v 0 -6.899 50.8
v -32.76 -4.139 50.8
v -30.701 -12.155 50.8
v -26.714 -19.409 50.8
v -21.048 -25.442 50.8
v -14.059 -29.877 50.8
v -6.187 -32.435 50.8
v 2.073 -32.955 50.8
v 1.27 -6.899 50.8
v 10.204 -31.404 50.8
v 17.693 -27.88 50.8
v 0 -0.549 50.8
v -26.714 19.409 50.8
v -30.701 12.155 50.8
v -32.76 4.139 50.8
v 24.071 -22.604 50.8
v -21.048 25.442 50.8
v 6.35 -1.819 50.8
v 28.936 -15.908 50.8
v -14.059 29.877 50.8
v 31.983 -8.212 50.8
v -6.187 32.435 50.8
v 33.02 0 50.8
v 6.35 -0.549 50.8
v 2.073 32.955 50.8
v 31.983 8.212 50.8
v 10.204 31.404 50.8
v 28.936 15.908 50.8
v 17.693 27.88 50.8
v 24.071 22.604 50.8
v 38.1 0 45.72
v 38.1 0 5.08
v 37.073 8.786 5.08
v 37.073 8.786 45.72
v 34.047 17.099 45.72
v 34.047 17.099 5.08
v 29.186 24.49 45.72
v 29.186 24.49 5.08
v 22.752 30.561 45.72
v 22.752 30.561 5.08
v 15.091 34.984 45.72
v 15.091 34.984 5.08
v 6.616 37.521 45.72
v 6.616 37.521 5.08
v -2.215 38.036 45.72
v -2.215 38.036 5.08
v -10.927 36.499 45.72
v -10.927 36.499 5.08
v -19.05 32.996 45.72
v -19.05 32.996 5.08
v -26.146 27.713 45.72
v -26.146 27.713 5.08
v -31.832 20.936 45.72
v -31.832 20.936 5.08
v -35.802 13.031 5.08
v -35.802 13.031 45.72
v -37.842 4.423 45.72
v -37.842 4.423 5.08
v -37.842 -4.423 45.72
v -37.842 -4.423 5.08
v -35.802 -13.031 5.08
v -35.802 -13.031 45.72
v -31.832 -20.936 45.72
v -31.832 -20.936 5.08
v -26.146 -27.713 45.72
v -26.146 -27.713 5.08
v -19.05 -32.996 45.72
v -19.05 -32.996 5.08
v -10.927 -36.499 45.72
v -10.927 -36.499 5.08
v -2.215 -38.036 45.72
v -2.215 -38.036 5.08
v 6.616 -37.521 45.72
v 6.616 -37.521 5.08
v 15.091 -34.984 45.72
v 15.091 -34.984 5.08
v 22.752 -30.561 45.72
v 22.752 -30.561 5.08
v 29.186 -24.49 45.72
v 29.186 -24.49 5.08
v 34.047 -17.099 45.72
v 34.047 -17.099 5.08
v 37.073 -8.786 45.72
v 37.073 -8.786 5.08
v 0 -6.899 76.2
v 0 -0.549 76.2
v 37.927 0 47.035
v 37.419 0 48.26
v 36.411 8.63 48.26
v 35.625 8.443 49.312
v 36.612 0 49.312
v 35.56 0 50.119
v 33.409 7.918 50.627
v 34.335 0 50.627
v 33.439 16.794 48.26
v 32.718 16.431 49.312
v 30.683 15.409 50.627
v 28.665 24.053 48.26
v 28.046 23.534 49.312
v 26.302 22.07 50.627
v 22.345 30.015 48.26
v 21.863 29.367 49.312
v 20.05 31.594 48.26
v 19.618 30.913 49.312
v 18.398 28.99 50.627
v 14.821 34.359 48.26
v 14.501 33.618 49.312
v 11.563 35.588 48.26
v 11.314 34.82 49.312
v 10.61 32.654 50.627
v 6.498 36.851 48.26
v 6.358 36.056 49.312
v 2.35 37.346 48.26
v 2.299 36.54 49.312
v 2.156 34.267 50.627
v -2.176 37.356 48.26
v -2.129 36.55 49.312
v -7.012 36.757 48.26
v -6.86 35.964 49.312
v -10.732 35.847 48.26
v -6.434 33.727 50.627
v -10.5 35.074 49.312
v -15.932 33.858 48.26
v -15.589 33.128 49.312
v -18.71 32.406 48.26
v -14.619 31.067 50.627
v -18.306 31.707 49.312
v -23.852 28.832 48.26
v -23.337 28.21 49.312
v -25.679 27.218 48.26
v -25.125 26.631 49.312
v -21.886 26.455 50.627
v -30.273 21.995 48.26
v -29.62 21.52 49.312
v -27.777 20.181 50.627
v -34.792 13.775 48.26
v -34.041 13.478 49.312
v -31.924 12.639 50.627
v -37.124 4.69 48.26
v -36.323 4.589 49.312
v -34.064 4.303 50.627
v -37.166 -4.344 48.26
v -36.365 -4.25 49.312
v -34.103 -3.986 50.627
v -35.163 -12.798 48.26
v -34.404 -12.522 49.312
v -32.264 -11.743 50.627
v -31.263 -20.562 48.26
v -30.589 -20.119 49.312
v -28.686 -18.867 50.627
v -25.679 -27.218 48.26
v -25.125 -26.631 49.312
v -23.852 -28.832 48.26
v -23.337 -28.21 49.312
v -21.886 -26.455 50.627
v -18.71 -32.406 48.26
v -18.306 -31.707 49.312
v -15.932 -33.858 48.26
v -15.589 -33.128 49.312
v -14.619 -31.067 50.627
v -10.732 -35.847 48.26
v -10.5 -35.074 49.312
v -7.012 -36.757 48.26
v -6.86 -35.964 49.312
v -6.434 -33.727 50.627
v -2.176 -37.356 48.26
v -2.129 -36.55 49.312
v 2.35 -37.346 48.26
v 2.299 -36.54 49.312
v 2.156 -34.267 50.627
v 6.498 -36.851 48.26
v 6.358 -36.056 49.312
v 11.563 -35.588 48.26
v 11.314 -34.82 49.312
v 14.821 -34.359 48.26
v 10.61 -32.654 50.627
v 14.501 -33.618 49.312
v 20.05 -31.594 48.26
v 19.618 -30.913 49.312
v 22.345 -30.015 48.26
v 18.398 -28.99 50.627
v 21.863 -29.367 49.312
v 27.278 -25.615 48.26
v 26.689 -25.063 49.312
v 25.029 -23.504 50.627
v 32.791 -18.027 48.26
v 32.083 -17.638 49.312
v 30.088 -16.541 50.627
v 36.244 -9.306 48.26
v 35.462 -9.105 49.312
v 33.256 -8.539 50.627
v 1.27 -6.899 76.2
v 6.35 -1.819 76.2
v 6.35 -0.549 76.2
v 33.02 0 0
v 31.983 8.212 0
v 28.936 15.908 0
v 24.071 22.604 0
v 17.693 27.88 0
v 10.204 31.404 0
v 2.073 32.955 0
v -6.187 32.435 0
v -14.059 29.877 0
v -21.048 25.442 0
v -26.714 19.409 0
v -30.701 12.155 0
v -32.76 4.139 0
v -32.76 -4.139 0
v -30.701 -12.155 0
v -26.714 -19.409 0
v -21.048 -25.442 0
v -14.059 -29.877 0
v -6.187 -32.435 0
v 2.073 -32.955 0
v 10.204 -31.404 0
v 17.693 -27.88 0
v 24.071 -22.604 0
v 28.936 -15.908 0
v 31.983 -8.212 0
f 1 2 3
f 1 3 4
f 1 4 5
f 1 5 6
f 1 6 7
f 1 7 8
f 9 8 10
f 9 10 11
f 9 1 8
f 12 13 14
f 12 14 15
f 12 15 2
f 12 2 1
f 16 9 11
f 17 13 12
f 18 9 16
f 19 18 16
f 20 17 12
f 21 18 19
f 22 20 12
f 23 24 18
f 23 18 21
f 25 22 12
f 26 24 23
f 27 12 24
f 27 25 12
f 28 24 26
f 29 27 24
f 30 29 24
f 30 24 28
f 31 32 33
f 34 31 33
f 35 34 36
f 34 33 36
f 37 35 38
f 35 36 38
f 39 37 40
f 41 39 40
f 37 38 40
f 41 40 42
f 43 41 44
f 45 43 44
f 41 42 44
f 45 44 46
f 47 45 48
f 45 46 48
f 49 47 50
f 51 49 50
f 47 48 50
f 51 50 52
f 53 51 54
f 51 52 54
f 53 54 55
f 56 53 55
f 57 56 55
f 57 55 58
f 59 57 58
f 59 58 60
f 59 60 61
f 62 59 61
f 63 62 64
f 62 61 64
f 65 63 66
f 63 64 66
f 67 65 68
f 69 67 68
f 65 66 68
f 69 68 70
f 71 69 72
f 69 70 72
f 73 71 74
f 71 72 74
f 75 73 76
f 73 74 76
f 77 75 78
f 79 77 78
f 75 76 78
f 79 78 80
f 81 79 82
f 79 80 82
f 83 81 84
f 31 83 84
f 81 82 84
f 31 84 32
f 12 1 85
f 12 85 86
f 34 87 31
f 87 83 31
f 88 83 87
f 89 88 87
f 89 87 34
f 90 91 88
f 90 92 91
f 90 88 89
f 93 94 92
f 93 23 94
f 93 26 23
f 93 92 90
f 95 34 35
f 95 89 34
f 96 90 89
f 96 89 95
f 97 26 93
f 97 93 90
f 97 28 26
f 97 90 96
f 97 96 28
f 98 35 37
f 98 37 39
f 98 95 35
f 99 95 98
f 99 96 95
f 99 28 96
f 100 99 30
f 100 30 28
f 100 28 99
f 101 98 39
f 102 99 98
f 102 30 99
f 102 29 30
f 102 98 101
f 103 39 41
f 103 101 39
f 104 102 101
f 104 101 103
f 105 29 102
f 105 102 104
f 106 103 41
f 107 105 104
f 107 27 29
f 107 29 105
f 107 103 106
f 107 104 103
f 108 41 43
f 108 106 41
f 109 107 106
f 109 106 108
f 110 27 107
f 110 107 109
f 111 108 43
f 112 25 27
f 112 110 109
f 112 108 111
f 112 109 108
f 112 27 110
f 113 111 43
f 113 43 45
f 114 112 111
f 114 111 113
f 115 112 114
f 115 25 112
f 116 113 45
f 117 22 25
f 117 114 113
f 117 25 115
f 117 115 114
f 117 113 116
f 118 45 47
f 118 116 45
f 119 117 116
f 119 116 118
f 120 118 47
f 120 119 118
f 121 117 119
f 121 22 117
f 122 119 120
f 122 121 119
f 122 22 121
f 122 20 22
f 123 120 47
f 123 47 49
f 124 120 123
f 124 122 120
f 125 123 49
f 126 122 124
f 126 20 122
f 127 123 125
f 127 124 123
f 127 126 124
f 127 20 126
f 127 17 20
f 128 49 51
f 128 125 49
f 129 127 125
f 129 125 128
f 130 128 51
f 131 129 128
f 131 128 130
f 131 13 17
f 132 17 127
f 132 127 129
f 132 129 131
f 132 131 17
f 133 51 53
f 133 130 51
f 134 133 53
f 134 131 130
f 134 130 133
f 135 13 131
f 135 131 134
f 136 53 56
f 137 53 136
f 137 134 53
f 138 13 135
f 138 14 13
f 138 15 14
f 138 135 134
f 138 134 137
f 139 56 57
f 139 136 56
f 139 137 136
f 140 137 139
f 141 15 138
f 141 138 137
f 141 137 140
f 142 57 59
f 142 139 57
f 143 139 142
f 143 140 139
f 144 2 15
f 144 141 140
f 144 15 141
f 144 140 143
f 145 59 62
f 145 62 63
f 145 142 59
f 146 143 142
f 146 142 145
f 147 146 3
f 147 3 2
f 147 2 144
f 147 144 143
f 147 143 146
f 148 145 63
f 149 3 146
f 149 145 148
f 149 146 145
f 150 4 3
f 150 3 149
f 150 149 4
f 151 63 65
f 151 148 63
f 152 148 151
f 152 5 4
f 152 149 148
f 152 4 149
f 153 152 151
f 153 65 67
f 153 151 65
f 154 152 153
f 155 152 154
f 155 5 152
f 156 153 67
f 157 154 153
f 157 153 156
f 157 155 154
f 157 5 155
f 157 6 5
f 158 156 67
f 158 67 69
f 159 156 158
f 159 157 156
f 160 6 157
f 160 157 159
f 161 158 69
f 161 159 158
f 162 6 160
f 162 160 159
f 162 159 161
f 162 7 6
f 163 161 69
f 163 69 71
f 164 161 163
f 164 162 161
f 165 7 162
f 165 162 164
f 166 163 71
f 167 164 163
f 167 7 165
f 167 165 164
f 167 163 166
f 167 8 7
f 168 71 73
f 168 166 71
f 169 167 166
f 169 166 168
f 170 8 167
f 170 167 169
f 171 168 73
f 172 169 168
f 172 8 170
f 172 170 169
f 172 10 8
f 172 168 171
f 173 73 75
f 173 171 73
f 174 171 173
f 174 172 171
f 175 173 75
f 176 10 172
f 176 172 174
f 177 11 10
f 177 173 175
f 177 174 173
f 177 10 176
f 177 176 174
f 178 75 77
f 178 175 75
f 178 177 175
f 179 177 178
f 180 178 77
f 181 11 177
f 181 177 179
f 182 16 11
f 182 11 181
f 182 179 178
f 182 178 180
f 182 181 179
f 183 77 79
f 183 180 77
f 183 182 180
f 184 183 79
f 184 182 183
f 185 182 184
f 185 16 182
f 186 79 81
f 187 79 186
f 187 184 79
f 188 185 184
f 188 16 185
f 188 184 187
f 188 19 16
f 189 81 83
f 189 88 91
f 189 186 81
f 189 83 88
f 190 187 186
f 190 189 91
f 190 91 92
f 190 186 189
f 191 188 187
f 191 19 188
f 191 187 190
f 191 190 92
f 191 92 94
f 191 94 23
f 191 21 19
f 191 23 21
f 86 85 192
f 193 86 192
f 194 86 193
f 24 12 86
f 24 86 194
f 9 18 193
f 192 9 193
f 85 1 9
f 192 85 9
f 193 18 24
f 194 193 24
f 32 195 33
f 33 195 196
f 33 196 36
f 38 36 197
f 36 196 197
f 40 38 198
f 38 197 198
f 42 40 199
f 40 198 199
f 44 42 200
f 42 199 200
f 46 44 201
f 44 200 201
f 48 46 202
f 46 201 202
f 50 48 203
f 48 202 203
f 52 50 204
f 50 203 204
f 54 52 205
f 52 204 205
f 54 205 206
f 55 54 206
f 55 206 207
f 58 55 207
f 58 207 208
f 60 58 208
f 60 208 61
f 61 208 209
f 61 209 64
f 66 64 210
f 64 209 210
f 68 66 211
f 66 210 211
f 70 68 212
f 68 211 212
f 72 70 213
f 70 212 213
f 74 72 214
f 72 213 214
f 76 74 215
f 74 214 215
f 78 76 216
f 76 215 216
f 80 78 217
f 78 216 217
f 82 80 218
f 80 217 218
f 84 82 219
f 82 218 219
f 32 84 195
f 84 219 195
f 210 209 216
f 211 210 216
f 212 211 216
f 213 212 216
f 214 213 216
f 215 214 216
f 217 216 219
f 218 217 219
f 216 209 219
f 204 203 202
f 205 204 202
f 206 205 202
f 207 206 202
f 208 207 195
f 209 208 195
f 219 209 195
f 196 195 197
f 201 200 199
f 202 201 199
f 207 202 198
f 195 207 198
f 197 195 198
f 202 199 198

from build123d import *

# Parameters (mm, degrees)
F0_R     = 38.1
F1_DEPTH = 50.8
F2_W     = 6.35
F2_H     = 6.35
F3_DEPTH = 76.2
F4_R     = 5.08
F5_SIZE  = 5.08


with BuildPart() as f1:
    # F0 (on Top) → F1 (new body)
    with BuildSketch(Plane.XY):
        Circle(F0_R)
    extrude(amount=F1_DEPTH)

    # F2 (on Top) → F3 (join)
    with BuildSketch(Plane.XY):
        with Locations((3.175, -3.723586)):
            Rectangle(F2_W, F2_H)
    extrude(amount=F3_DEPTH)

    # F4
    f4_edges = [f1.edges().sort_by_distance(p)[0] for p in [
        (-38.1, 0, 50.8),
    ]]
    fillet(f4_edges, radius=F4_R)

    # F5
    f5_edges = [f1.edges().sort_by_distance(p)[0] for p in [
        (6.35, -6.898586, 63.5),
        (-38.1, 0, 0),
    ]]
    chamfer(f5_edges, length=F5_SIZE)


solid = f1.part
